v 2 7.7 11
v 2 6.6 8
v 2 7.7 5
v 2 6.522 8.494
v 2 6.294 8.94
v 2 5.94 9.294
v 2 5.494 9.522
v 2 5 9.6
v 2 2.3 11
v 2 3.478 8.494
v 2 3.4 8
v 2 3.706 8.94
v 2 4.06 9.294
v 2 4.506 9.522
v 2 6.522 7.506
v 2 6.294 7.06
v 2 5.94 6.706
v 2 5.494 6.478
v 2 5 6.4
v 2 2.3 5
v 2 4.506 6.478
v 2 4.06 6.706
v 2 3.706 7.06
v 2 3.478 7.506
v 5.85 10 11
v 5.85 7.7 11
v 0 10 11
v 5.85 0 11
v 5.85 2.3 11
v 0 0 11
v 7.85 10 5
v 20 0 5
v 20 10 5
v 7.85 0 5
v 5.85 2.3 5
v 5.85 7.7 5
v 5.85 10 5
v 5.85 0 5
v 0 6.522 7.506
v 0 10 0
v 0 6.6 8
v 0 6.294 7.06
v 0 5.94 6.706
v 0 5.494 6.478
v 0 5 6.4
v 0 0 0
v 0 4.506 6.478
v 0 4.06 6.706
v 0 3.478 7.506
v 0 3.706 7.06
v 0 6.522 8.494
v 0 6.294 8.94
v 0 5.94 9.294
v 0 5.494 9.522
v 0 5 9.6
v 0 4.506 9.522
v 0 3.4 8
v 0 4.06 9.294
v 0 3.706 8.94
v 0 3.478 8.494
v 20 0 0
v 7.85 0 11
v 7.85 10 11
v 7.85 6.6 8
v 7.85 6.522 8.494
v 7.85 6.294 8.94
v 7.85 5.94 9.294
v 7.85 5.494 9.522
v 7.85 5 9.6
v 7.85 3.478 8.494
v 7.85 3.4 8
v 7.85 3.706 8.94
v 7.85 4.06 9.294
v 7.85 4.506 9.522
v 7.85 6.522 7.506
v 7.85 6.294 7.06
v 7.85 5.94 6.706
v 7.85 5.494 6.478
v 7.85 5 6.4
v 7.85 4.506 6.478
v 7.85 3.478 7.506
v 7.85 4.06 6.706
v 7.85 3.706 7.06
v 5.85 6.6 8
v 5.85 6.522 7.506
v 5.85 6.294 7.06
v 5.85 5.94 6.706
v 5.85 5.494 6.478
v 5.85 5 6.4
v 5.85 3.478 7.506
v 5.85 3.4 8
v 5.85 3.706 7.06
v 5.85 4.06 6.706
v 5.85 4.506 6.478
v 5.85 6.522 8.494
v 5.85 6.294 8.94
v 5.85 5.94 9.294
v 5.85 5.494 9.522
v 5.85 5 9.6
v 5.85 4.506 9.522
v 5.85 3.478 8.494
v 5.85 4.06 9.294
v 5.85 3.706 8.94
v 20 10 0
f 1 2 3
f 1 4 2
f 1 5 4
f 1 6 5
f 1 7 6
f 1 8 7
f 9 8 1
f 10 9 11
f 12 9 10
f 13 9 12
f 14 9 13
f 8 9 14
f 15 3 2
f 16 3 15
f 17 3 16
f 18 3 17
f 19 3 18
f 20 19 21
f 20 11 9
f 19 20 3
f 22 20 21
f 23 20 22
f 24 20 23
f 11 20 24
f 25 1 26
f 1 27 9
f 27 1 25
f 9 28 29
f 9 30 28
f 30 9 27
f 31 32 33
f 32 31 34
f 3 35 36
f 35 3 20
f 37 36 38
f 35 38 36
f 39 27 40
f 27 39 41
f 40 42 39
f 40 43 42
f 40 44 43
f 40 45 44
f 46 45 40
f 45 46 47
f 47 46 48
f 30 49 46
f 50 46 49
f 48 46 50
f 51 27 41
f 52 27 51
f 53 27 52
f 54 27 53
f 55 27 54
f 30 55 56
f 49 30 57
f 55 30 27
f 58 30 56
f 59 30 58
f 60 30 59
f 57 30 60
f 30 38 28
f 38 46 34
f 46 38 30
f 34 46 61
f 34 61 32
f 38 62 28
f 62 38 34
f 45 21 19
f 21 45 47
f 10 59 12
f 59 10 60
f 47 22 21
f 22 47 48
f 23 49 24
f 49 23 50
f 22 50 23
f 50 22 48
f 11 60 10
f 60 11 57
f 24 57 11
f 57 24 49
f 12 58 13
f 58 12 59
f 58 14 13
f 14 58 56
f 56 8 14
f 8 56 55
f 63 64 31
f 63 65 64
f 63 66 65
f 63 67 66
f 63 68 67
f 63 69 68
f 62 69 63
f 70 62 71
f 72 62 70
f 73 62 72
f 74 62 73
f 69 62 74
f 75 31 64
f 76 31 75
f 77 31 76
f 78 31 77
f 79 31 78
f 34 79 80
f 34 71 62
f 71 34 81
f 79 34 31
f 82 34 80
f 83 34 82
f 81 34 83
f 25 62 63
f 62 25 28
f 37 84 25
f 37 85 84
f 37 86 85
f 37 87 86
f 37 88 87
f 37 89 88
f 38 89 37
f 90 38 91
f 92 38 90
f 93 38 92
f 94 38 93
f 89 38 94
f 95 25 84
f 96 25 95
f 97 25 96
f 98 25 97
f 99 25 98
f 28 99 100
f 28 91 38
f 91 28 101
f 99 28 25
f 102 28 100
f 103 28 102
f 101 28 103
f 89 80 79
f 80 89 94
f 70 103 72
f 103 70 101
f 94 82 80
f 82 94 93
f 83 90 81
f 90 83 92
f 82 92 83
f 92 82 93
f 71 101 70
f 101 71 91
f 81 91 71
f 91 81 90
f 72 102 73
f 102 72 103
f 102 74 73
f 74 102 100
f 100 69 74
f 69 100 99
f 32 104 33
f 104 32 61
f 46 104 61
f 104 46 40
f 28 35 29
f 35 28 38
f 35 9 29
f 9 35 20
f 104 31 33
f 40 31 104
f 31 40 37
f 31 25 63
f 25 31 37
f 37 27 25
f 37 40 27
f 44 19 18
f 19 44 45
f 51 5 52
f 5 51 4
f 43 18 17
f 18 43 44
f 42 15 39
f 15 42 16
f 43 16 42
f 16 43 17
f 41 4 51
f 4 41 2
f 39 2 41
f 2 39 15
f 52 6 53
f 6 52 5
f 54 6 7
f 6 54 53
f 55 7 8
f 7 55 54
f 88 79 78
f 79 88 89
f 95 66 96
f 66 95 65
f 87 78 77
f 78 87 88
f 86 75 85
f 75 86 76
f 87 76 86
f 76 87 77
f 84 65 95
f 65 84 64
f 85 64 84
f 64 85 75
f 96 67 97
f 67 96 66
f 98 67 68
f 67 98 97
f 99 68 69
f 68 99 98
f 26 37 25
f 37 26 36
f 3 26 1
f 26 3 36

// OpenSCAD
// [FL_INDEX: keywords="openscad, 3d_parametric, Easy_adjust_Z-stop_parametric, csg_solid" | COT="Parametric OpenSCAD design from 3DCodeverse"]
// Title: Easy adjust Z-stop parametric

//------------------------------------------------------------
// Parametric easy adjust z-stop 
//
// http://www.thingiverse.com/wardwouts
// 
//
//------------------------------------------------------------

// Determines the heigth of the hole for the nut
nut_height = 3.85;
// Determines the width of the hole for the nut
nut_width_short = 5.4;
// Determines the depth of the hole for the nut
nut_width_long = 6.0;

// How thick should the bit above and below the nut be?
nut_holder_thickness = 2;

// of the piece
width = 10;
// Length of the base
base_length = 20;
// Thickness of the base
base_thickness = 5;

// How big should the screw hole be?
outer_thread = 3.2;

nut_holder_depth = nut_width_long;

// code below

module base() {
	// simple bar to glue to the x-idler
	cube([base_length,width/2,base_thickness]);
}

module end() {
	translate([0,0,base_thickness]){
		difference(){
			cube([nut_holder_thickness,width/2, nut_holder_depth]);
			translate([-nut_holder_thickness,width/2,nut_holder_depth/2]){
				rotate([0,90,0]){
					cylinder(h=nut_holder_thickness*3,r=outer_thread/2,$fn=20);
				}
			}
		}
	}
}

module side() {
	translate([nut_holder_thickness,0,base_thickness]){
		cube([nut_height,(width-nut_width_short)/2,nut_holder_depth]);
	}
}

module halfpart(){
	base();
	end();
	translate([nut_height+nut_holder_thickness,0,0]){
		end();
	}
	side();
}

halfpart();
translate([0,width,0]){
	mirror([0,1,0]){
		halfpart();
	}
}
